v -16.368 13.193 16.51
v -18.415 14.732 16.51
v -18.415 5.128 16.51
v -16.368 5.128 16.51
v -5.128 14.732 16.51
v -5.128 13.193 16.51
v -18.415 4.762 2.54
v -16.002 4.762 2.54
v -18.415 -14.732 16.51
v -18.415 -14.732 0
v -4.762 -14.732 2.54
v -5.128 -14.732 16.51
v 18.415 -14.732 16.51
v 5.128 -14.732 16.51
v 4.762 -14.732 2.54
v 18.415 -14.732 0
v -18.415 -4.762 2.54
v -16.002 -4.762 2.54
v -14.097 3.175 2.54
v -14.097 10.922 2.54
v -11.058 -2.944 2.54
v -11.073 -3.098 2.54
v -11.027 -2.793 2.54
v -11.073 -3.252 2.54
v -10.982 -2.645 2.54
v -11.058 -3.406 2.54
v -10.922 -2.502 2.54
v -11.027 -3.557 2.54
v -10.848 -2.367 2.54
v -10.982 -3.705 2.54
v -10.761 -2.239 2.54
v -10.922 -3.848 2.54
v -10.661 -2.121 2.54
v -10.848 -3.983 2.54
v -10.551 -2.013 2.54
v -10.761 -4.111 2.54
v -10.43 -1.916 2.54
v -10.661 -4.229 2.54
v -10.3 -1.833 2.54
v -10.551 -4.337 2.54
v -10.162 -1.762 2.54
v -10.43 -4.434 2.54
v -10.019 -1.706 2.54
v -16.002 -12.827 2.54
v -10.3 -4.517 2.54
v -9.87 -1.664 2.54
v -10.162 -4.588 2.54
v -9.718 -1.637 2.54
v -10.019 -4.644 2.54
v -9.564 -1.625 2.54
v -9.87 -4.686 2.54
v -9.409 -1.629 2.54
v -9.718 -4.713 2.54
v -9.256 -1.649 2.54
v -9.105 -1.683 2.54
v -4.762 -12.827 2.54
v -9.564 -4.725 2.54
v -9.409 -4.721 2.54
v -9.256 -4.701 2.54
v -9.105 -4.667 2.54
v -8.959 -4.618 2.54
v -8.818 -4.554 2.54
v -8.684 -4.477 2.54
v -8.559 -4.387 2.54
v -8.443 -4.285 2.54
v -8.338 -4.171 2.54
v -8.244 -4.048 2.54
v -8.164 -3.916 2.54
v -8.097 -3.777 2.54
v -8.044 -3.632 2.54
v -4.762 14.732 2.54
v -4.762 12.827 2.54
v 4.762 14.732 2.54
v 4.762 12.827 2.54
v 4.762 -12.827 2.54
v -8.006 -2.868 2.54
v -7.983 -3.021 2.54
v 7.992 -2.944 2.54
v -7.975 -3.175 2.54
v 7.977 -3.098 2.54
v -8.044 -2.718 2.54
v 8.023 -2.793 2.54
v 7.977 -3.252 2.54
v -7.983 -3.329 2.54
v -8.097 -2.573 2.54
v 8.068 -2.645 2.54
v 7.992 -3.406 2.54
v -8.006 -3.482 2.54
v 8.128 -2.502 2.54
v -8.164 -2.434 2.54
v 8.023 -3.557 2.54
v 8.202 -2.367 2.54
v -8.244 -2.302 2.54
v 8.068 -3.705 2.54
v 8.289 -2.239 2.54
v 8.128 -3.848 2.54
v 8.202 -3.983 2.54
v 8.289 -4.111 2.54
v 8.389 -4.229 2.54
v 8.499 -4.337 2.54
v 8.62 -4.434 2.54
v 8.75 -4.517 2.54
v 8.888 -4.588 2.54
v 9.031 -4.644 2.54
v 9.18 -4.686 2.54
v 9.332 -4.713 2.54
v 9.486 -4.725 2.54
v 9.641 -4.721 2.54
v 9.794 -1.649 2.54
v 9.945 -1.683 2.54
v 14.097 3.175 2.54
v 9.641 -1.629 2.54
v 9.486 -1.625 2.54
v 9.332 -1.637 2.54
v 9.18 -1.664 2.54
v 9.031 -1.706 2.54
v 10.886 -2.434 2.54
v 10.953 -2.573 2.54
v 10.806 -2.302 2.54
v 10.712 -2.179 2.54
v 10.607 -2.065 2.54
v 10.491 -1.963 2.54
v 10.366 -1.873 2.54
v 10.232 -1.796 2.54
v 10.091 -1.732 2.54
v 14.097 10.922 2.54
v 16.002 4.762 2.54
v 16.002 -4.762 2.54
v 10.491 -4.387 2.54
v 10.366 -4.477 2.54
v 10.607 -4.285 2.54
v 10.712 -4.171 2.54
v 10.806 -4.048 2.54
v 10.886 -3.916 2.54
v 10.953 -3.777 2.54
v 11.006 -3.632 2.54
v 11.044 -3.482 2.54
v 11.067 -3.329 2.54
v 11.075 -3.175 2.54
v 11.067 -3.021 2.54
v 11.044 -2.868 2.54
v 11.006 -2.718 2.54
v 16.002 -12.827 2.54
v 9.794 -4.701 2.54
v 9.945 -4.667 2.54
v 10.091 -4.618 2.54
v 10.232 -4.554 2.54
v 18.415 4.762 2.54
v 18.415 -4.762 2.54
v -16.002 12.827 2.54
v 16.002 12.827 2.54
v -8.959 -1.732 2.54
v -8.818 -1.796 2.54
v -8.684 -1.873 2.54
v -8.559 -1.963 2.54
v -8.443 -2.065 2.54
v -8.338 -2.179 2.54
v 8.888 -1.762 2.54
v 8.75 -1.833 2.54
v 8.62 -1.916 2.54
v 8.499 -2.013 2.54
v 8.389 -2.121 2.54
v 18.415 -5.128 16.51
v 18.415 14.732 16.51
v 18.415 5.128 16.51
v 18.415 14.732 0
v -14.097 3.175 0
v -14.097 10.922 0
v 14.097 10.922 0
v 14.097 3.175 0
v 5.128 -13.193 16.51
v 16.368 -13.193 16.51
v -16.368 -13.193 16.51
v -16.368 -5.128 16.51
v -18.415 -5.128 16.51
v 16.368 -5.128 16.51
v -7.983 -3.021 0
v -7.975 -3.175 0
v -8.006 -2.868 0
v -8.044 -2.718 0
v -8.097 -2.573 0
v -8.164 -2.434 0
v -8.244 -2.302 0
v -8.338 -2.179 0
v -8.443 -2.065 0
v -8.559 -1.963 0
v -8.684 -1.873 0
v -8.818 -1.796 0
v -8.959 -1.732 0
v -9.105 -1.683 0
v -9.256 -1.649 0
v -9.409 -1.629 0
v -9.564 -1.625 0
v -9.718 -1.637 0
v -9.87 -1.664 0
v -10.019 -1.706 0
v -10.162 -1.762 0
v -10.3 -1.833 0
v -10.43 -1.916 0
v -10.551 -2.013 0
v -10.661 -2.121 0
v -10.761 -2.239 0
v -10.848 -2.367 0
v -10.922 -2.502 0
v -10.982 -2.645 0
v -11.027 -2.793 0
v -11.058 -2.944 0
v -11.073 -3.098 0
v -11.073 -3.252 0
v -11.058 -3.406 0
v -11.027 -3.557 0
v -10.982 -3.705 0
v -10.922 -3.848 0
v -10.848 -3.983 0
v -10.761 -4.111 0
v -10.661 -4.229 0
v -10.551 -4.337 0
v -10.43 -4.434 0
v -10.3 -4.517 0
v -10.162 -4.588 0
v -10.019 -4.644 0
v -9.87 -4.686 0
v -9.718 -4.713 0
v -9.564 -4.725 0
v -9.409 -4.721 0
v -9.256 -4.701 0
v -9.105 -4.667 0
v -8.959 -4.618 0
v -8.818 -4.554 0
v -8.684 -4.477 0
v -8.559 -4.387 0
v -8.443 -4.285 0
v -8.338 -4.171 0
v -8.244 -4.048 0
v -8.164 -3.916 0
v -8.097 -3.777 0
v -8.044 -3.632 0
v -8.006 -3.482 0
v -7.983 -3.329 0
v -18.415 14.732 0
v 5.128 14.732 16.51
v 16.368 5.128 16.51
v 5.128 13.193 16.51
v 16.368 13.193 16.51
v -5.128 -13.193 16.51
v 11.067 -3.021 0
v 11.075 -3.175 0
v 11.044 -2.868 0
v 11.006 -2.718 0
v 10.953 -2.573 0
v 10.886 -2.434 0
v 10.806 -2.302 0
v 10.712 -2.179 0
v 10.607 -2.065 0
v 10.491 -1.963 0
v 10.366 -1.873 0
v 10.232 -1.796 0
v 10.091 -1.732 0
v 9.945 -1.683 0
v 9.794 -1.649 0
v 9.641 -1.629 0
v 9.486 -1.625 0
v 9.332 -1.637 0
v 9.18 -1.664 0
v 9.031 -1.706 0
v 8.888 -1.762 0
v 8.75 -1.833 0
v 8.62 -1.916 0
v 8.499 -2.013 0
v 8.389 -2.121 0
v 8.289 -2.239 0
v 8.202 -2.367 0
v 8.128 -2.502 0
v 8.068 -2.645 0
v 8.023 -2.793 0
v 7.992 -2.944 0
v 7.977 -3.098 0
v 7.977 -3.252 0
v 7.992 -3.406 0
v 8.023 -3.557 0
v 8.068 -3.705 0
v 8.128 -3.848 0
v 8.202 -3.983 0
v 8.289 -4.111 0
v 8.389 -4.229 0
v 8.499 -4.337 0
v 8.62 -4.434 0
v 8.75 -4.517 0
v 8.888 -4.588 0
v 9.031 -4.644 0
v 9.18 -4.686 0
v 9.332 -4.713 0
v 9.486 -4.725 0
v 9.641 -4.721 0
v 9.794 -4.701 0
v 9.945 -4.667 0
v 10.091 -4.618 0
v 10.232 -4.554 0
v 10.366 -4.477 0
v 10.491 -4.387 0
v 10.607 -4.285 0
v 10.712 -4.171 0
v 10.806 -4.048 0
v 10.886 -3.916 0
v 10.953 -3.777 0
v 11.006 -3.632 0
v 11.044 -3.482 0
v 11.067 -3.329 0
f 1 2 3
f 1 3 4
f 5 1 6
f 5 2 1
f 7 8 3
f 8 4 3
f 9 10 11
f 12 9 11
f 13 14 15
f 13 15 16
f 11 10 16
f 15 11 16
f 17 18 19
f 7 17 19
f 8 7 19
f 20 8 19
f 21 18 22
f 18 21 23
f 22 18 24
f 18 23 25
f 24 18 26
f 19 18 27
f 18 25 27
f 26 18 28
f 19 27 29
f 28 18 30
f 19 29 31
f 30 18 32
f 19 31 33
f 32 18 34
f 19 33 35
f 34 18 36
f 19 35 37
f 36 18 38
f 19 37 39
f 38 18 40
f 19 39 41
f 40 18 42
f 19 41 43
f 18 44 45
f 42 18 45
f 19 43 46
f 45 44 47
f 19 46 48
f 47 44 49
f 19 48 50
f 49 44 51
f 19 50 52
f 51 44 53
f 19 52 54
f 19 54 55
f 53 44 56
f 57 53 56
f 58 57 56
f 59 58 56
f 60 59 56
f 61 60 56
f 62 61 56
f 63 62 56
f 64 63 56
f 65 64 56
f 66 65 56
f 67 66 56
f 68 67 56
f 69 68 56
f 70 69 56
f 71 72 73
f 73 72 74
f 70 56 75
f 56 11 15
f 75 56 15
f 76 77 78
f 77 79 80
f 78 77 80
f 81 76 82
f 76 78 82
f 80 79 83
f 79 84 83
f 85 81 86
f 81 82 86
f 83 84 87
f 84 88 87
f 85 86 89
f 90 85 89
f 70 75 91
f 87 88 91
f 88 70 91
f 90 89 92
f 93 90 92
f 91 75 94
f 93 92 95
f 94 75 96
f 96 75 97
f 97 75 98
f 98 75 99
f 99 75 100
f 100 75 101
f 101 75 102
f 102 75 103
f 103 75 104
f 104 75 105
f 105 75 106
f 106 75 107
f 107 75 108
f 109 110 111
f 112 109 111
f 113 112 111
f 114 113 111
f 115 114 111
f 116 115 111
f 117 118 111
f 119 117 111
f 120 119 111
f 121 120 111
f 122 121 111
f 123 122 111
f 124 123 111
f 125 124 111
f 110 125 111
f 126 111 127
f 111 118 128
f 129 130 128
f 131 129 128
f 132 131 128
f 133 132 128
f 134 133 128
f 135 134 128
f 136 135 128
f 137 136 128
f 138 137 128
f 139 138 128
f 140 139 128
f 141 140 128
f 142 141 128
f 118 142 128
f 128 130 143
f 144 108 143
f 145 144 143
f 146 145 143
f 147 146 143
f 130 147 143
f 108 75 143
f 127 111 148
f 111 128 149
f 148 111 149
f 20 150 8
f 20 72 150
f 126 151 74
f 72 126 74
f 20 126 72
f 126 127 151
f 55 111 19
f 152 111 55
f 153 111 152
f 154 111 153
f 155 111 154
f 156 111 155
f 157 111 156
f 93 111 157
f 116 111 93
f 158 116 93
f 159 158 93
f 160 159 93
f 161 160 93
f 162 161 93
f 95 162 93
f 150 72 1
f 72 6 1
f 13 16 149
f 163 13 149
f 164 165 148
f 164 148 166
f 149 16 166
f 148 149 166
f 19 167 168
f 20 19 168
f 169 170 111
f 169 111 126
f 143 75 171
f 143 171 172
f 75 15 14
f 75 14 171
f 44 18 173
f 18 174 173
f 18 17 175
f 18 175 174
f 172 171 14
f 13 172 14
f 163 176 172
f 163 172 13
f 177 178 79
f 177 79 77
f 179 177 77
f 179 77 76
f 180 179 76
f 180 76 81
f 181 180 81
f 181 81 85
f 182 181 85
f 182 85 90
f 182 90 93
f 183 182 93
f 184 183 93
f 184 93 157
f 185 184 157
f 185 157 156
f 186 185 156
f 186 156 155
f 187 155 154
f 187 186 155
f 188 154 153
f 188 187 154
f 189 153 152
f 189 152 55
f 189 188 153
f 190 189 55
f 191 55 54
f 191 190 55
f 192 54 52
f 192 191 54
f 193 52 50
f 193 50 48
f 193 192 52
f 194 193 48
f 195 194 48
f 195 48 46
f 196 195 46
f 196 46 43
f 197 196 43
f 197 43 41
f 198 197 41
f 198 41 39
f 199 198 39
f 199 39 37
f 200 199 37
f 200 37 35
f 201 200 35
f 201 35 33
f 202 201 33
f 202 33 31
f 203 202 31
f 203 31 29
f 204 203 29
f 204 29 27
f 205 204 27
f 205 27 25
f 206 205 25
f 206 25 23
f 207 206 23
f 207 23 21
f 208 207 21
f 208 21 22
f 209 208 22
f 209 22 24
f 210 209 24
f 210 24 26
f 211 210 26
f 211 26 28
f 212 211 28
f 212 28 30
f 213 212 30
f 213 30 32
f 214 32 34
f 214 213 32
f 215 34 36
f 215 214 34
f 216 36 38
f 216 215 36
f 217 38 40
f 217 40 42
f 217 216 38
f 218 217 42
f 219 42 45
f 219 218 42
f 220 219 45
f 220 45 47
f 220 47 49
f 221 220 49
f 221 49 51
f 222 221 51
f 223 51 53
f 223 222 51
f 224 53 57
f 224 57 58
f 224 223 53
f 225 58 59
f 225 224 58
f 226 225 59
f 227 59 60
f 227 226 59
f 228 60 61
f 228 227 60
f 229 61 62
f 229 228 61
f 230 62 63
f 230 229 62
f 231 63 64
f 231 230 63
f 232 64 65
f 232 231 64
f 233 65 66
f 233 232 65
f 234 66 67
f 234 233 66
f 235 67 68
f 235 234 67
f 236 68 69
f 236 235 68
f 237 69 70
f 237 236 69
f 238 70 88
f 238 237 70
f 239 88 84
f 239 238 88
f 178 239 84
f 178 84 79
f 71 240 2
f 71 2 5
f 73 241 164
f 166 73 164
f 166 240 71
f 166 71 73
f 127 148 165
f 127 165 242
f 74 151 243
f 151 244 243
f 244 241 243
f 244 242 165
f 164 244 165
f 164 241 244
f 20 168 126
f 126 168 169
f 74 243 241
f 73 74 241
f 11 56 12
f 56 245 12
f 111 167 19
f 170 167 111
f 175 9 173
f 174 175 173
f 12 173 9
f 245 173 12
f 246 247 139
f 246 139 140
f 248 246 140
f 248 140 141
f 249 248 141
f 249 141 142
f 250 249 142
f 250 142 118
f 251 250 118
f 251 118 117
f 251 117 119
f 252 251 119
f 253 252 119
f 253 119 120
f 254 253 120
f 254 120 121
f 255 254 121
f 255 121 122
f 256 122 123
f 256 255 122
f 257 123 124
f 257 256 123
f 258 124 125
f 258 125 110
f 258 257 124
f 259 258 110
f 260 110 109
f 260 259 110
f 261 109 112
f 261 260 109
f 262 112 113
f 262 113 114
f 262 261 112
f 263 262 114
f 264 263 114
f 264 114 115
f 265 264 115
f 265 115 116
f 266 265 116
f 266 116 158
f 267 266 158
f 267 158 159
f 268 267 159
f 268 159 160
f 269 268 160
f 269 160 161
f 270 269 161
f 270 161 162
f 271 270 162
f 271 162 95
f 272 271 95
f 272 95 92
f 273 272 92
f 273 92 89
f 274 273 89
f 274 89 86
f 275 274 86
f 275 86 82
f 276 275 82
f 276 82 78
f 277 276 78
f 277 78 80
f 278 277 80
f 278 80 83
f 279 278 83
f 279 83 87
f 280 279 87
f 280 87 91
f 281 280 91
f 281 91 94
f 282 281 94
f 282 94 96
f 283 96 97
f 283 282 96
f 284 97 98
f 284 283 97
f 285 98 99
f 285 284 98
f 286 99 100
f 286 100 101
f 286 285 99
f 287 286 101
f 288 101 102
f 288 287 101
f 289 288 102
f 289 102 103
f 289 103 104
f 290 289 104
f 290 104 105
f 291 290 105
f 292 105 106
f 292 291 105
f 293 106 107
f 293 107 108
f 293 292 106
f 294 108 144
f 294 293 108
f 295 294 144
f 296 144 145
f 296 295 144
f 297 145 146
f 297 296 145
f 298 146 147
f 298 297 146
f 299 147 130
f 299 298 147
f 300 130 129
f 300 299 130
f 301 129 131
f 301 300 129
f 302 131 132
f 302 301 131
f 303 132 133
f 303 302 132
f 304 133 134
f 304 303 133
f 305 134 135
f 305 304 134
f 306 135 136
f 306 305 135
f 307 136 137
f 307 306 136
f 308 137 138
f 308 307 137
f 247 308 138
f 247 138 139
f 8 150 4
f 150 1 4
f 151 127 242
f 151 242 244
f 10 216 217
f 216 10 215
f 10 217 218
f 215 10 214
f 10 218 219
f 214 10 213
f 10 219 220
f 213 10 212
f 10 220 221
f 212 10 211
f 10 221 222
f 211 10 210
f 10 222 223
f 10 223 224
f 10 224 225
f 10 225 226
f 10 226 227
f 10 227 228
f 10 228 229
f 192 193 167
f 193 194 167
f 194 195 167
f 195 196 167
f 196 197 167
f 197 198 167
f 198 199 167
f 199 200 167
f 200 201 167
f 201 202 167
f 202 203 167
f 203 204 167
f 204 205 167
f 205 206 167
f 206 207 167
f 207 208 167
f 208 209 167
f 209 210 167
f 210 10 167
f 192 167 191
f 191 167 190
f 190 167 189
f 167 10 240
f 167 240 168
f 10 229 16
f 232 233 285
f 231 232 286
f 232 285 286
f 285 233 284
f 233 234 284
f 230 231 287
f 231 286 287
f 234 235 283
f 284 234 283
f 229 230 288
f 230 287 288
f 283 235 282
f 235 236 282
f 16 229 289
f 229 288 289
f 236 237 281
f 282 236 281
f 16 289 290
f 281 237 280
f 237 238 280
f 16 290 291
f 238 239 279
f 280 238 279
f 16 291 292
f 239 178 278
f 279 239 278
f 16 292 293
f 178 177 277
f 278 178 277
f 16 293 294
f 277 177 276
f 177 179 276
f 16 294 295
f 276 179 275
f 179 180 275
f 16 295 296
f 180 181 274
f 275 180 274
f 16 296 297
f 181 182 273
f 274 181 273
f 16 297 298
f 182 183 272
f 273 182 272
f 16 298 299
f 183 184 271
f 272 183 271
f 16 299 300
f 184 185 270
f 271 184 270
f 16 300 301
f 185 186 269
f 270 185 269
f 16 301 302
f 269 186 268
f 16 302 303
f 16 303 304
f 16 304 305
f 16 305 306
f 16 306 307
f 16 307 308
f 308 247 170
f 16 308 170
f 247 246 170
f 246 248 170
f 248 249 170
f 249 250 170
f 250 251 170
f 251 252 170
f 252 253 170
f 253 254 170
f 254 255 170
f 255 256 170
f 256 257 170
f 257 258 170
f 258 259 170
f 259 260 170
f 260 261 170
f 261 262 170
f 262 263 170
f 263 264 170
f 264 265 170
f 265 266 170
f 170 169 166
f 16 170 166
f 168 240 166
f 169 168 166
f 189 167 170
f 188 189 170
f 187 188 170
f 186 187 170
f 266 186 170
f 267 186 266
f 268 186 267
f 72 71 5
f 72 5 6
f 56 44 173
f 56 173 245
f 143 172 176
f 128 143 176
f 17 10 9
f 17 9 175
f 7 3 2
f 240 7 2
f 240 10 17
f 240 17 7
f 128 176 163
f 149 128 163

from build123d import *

# Parameters (mm, degrees)
SKETCH2_W           = 36.83
SKETCH2_H           = 29.464
SKETCH2_R           = 1.55
SKETCH2_W_2         = 28.194
SKETCH2_H_2         = 7.747
BOSS_EXTRUDE1_DEPTH = 16.51
CUT_EXTRUDE1_START  = 2.54
SKETCH2_5_W         = 32.004
SKETCH2_5_H         = 25.654
SKETCH2_5_R         = 1.55
SKETCH2_5_W_2       = 28.194
SKETCH2_5_H_2       = 7.747
SKETCH2_5_W_3       = 2.413
SKETCH2_5_H_3       = 9.525
SKETCH2_5_W_4       = 9.525
SKETCH2_5_H_4       = 1.905
CUT_EXTRUDE1_DEPTH  = 14.97
CUT_EXTRUDE1_TAPER  = -1.5


with BuildPart() as part:
    # Sketch2 → Boss-Extrude1 (new body)
    with BuildSketch(Plane.XY):
        Rectangle(SKETCH2_W, SKETCH2_H)
        with Locations((-9.525, -3.175)):
            Circle(SKETCH2_R, mode=Mode.SUBTRACT)
        with Locations((9.525, -3.175)):
            Circle(SKETCH2_R, mode=Mode.SUBTRACT)
        with Locations((0, 7.0485)):
            Rectangle(SKETCH2_W_2, SKETCH2_H_2, mode=Mode.SUBTRACT)
    extrude(amount=BOSS_EXTRUDE1_DEPTH)

    # Sketch2<5> → Cut-Extrude1 (cut, through all)
    with BuildSketch(Plane.XY.offset(CUT_EXTRUDE1_START)):
        Rectangle(SKETCH2_5_W, SKETCH2_5_H)
        with Locations((9.525, -3.175)):
            Circle(SKETCH2_5_R, mode=Mode.SUBTRACT)
        with Locations((-9.525, -3.175)):
            Circle(SKETCH2_5_R, mode=Mode.SUBTRACT)
        with Locations((0, 7.0485)):
            Rectangle(SKETCH2_5_W_2, SKETCH2_5_H_2, mode=Mode.SUBTRACT)
        with Locations((17.2085, 0)):
            Rectangle(SKETCH2_5_W_3, SKETCH2_5_H_3)
        with Locations((0, -13.7795)):
            Rectangle(SKETCH2_5_W_4, SKETCH2_5_H_4)
        with Locations((-17.2085, 0)):
            Rectangle(SKETCH2_5_W_3, SKETCH2_5_H_3)
        with Locations((0, 13.7795)):
            Rectangle(SKETCH2_5_W_4, SKETCH2_5_H_4)
    extrude(amount=CUT_EXTRUDE1_DEPTH, taper=CUT_EXTRUDE1_TAPER, mode=Mode.SUBTRACT)


solid = part.part
